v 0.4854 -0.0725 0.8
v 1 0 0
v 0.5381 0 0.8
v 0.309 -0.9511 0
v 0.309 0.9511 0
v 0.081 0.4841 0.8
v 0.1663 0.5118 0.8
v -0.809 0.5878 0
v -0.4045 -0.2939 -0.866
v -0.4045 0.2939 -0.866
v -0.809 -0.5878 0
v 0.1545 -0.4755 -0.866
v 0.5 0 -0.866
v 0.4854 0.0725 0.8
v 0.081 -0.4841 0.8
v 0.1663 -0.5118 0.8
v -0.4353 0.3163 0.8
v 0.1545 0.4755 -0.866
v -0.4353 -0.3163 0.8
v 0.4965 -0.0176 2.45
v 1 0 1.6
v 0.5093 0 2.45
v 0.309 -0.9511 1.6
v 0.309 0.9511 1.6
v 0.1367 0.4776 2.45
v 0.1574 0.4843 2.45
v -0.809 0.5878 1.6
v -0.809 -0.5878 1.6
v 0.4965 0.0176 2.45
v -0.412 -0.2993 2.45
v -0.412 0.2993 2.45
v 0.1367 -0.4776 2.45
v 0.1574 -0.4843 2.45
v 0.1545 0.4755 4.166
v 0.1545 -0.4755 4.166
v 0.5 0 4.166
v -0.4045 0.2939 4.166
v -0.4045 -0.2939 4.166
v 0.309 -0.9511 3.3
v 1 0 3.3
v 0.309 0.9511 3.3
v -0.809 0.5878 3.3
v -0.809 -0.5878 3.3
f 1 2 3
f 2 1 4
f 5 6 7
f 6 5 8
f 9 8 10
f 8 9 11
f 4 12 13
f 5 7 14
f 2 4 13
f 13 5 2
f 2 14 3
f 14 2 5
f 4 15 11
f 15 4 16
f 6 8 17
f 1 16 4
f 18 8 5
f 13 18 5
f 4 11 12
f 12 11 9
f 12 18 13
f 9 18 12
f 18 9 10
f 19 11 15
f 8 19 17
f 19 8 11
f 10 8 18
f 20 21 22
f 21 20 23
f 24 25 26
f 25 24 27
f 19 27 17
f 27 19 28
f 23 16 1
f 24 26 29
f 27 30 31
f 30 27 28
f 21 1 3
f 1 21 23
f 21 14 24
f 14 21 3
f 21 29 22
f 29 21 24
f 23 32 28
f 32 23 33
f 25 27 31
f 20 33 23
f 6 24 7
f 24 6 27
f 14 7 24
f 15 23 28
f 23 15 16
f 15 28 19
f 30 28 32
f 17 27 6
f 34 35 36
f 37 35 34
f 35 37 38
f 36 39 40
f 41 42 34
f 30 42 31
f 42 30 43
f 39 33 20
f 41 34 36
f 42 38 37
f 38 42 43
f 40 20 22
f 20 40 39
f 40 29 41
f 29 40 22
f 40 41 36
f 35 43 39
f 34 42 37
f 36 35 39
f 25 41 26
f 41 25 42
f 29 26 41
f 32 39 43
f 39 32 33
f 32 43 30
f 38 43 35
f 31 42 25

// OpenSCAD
//Size of bottom?
size=1;

//How big is his tummy
tummy=1;

// How big is his head
head=1;



module snow(){
    

sphere(size, center=true);
bite=size/1.25;

rig=tummy/1.25;
translate([0,0,bite+rig]) 
   sphere(tummy);

hw=head;
translate([0,0,1.5*tummy+bite+hw]) 
   sphere(head);
}

module finalprint(){difference(){
    snow();
      translate([0,0,-60]){cube(100,center=true);
      };
    
 
    }
}


finalprint();

    
